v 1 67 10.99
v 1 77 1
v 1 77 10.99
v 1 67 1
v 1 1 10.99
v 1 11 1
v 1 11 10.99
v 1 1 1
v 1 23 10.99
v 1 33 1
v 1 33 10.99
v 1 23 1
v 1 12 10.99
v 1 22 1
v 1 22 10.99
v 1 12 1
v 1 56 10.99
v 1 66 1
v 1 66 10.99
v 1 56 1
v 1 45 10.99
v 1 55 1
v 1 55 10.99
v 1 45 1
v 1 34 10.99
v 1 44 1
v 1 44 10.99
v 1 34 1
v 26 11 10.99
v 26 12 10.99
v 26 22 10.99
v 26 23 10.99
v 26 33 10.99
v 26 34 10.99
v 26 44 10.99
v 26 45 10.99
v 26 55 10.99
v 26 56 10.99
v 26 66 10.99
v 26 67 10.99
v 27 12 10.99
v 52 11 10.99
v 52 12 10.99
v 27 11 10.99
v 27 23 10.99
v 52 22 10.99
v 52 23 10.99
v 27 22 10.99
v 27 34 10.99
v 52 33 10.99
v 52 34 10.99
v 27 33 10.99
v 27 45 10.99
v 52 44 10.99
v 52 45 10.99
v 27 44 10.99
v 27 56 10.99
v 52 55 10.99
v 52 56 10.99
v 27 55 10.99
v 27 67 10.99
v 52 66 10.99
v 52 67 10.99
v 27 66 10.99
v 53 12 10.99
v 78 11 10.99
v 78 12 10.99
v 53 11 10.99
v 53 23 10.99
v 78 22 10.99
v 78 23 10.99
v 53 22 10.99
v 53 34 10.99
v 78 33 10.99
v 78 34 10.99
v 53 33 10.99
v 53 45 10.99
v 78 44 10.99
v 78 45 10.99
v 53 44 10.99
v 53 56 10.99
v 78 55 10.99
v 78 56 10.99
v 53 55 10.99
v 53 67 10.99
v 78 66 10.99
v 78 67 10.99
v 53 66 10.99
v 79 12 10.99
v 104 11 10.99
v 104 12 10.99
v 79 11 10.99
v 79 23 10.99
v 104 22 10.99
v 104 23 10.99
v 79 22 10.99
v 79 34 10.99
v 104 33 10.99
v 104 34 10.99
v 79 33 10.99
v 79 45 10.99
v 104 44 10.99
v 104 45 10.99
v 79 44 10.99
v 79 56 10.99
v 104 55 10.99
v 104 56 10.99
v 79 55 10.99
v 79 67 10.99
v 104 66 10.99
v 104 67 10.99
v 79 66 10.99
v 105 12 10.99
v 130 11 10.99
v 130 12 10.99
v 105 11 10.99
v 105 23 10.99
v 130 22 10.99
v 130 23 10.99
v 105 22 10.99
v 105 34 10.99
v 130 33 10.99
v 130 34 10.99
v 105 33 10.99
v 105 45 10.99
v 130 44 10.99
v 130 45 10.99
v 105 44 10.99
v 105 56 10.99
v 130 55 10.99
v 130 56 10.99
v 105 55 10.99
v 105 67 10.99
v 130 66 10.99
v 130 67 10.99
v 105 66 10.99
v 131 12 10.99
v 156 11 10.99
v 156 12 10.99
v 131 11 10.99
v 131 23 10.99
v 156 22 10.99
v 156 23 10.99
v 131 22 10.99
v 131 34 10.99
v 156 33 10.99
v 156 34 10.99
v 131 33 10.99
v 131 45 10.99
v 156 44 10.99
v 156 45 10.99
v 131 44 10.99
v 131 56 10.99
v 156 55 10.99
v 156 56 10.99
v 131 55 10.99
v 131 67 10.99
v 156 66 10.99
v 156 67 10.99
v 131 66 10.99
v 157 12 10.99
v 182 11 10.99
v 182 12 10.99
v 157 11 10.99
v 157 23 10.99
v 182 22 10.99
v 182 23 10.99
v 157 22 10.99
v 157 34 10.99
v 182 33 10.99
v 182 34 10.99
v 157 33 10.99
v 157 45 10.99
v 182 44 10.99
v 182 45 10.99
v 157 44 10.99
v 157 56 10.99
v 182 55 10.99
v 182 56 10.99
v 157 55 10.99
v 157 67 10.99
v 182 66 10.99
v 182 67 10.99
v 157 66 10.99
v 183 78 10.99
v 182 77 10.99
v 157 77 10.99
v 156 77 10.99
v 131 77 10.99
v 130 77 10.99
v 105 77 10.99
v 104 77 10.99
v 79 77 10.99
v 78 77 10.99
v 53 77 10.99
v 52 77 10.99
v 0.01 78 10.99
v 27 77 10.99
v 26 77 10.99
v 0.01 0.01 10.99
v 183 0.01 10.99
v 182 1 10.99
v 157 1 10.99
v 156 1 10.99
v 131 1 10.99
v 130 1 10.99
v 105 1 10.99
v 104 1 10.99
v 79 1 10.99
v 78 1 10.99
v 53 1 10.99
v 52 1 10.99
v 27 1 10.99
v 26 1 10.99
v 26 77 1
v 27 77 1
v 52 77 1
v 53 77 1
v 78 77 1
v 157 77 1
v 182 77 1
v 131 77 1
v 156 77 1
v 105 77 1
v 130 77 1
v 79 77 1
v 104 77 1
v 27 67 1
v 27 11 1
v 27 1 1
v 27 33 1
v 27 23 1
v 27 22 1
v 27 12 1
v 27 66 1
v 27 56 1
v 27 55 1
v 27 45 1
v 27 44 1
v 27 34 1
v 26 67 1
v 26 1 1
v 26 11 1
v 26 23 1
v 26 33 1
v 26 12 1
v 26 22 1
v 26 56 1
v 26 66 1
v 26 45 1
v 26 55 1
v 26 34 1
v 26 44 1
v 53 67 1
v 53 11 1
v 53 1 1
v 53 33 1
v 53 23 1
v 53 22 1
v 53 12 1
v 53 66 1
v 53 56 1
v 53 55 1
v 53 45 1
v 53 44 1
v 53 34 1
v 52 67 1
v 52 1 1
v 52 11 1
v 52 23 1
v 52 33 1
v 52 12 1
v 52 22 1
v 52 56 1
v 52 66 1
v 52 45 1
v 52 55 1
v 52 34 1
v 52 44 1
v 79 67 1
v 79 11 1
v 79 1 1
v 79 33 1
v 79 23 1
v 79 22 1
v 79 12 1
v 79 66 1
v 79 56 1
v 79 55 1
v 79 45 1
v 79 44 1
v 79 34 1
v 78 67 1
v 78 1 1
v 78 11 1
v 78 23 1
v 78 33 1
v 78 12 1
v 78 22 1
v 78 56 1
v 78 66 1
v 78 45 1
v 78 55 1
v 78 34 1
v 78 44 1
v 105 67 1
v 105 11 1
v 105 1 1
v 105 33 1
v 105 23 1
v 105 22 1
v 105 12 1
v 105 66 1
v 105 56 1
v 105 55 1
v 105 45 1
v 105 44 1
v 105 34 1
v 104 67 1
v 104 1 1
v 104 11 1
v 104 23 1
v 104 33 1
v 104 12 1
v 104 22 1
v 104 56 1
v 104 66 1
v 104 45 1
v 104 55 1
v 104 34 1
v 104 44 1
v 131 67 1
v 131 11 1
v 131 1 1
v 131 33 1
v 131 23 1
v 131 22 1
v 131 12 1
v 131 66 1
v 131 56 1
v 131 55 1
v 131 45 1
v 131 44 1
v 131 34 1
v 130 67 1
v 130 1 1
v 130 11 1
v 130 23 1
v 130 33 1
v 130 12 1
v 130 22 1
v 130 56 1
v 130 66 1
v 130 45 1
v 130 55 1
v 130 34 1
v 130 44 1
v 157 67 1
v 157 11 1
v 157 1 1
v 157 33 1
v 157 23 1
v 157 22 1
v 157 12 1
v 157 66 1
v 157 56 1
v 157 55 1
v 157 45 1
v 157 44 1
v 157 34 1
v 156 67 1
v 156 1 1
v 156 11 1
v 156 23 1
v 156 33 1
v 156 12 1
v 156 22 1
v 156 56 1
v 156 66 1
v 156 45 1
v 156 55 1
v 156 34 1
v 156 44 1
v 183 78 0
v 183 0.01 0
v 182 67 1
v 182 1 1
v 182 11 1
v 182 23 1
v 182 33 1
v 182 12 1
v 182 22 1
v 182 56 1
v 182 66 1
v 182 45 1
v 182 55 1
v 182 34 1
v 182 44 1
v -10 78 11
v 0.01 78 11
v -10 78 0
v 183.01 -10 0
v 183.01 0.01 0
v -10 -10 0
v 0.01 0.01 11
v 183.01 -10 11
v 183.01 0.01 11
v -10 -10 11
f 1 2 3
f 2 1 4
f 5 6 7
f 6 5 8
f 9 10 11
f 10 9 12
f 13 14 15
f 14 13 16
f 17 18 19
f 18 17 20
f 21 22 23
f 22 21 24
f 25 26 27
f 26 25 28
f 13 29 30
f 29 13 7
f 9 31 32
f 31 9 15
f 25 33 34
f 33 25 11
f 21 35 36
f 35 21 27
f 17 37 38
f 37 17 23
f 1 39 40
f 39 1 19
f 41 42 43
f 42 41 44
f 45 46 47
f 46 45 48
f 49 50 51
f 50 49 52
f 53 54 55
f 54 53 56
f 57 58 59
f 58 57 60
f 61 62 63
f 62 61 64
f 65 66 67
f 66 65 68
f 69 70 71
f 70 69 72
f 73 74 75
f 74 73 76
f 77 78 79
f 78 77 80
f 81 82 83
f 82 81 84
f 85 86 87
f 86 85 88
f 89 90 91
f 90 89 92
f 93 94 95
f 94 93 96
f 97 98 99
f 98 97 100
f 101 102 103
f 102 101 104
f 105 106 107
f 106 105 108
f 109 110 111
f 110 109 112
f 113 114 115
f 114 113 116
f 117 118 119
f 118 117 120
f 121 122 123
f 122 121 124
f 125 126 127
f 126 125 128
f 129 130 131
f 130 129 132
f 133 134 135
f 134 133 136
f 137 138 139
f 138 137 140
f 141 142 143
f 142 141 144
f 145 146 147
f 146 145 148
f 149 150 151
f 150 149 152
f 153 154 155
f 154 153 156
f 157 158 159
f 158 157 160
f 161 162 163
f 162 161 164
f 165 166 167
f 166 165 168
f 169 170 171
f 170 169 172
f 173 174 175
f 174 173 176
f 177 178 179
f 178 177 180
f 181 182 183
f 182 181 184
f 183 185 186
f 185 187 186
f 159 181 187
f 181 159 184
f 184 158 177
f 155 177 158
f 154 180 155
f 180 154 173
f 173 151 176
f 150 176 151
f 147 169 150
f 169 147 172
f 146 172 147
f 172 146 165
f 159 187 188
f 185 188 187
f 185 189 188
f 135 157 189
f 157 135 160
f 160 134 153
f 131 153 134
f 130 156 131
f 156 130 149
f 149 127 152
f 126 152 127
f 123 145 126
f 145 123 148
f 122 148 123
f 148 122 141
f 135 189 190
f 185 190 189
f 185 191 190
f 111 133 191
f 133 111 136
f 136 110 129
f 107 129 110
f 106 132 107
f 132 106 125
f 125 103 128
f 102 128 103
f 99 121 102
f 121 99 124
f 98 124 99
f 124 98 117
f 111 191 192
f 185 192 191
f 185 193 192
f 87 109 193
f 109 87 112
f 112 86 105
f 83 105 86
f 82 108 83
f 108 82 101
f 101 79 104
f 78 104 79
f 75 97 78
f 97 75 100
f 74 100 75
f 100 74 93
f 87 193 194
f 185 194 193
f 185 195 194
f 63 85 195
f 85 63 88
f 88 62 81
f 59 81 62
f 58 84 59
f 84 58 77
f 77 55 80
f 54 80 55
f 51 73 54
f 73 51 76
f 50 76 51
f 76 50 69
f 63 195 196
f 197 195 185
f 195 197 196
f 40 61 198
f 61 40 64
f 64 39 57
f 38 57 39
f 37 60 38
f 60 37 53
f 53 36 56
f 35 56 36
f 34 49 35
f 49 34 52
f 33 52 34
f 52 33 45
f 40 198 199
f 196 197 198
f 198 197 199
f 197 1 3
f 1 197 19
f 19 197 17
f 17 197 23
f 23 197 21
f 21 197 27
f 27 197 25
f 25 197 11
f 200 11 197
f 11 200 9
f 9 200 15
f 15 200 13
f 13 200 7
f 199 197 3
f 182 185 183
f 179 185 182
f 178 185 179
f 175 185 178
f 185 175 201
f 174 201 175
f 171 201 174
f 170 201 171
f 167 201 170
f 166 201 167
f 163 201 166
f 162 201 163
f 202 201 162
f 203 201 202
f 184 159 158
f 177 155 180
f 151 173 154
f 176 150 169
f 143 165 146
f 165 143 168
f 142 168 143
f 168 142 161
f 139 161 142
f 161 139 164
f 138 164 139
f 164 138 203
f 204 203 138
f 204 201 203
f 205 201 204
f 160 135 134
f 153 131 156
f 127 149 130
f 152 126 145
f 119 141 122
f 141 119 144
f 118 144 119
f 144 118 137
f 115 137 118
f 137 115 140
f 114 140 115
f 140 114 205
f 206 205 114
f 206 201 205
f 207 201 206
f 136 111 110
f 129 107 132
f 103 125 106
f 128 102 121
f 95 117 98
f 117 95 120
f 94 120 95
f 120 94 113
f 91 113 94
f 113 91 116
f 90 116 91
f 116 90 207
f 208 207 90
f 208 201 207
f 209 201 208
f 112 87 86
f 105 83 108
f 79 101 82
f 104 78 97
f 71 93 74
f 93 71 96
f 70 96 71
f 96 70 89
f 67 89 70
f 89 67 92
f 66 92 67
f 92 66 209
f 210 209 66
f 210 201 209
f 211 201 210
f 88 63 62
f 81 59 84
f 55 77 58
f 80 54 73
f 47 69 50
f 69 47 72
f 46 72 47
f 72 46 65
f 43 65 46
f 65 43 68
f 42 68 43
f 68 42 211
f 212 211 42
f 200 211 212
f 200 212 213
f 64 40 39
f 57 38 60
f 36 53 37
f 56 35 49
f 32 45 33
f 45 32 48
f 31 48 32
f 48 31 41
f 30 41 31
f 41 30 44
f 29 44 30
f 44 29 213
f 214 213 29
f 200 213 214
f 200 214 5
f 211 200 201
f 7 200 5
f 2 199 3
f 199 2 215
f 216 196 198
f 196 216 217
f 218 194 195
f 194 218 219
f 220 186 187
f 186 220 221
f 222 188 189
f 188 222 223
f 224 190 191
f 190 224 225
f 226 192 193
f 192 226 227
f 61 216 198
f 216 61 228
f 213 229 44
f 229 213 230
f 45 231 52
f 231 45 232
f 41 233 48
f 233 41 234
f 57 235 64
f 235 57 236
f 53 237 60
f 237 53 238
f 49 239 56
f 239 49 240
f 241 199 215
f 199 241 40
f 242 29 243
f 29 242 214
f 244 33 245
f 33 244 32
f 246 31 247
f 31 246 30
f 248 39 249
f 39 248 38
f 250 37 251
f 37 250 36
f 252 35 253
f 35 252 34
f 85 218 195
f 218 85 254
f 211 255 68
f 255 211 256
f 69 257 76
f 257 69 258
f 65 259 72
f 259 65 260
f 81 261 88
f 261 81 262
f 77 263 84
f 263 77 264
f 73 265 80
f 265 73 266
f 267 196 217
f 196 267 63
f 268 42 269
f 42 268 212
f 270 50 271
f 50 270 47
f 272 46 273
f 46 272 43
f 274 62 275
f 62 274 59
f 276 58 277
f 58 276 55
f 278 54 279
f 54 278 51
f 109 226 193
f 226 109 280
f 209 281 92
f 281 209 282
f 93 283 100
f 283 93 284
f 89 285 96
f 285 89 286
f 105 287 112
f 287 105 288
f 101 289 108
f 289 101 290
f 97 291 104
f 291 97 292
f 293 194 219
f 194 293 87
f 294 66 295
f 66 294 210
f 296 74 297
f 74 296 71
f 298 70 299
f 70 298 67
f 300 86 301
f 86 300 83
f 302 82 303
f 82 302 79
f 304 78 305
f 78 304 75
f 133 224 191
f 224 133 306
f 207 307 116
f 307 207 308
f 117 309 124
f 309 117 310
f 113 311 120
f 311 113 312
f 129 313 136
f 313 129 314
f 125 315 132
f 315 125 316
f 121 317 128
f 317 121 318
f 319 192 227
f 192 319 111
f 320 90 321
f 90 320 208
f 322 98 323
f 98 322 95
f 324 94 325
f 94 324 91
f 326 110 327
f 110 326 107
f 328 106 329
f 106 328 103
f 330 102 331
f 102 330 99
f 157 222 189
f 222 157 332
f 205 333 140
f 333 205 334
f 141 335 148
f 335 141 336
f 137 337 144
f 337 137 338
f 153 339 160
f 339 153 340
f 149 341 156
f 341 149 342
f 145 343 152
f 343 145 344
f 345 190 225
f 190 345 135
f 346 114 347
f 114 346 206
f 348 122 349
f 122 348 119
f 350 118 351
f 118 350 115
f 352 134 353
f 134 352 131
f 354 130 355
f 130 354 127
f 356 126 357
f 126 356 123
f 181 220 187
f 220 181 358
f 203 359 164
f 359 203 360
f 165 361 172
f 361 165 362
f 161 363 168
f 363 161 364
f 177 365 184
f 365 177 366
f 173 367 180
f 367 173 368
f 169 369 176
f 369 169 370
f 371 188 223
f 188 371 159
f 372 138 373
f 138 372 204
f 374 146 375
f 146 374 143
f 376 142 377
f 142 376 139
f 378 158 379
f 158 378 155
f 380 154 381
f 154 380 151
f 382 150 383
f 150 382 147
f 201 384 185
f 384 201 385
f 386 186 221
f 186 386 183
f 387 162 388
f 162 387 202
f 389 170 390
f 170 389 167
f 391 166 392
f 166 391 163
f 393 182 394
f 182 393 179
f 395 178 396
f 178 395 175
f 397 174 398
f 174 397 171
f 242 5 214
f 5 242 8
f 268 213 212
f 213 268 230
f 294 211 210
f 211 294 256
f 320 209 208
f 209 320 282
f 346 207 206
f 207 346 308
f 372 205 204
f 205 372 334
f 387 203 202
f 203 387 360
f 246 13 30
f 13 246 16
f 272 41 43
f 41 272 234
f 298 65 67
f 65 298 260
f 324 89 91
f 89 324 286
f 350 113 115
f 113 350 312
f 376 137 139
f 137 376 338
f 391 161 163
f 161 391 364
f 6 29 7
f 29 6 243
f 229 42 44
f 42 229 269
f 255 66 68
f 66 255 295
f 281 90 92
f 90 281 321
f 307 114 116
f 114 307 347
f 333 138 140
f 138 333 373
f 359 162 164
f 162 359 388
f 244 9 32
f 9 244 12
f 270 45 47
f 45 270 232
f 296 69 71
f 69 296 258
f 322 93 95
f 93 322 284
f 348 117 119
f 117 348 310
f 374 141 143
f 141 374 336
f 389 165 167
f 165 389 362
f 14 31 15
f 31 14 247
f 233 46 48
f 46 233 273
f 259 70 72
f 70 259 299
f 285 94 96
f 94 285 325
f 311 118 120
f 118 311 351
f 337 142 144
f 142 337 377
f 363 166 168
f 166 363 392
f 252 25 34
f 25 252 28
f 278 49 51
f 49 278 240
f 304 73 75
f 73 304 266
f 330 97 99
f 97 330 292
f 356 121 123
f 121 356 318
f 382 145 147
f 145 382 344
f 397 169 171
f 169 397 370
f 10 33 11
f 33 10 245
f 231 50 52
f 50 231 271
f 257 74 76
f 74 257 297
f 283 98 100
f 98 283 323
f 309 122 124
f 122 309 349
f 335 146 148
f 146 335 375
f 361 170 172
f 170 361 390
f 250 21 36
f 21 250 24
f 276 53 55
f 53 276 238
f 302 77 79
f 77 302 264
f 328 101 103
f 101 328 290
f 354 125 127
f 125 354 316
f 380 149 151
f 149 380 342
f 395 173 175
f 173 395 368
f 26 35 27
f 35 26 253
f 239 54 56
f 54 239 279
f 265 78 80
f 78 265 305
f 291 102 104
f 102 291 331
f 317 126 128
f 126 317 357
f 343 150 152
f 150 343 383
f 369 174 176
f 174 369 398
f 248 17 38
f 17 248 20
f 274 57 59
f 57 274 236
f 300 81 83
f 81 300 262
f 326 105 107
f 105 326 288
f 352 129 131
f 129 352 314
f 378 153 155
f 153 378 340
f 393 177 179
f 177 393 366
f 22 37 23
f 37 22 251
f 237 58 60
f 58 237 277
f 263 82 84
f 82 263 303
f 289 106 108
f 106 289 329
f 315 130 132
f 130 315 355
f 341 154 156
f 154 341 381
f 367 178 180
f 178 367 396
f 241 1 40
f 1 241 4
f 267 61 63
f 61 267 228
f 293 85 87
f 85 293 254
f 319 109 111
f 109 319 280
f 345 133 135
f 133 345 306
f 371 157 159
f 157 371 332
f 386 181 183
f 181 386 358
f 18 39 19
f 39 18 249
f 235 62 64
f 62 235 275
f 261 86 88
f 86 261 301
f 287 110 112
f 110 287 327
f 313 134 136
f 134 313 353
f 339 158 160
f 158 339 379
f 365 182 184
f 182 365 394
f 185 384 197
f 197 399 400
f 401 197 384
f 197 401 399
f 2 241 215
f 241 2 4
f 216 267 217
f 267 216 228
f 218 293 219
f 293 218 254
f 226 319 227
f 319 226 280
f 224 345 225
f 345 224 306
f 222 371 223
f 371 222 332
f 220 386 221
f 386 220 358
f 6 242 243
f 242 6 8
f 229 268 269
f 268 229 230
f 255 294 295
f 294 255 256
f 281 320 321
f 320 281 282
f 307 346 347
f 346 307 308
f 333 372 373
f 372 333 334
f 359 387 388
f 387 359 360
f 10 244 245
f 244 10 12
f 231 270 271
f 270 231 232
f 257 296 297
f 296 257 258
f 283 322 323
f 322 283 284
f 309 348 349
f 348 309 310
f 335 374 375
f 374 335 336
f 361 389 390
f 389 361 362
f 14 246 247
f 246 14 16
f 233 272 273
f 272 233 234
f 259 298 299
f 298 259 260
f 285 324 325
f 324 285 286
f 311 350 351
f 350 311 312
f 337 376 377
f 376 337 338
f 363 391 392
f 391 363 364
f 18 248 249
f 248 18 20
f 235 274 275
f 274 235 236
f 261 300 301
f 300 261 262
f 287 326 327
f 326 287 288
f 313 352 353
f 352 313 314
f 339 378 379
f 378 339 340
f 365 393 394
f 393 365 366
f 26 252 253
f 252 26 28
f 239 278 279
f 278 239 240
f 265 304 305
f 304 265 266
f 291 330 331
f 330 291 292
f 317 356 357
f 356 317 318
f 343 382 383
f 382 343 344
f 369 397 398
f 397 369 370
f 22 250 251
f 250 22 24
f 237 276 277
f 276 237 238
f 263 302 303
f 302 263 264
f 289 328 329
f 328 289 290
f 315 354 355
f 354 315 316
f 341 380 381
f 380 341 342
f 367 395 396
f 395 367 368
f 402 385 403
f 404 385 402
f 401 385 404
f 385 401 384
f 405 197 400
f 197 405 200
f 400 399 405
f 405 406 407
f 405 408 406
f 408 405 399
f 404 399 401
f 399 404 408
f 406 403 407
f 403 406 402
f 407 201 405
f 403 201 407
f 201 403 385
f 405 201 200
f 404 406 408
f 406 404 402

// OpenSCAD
t      =  1;
h      = 10;
cellW  = 25;
cellD  = 10;
days   =  7;
perDay =  7;
eps    =  0.01;
tag    = 10;

cube( [ days * cellW + (days+1) * t, perDay * cellD + (perDay+1) * t, t ] );

translate( [ -tag, 0, 0 ] ) {
    cube( [ tag+eps, perDay * cellD + (perDay+1) * t, t+h ] );
}

translate( [ -tag, -tag, 0 ] ) {
    cube( [ tag+eps + days * cellW + (days+1) * t, tag+eps, t+h ] );
}

for( day = [ 0 : days ] ) {
    translate( [ day * ( cellW + t ), 0, t-eps ] ) {
        cube( [ t, perDay * (cellD+t) , h ] );
    }
}
for( when = [ 0 : perDay ] ) {
    translate( [ 0, when * ( cellD + t ), t-eps ] ) {
        cube( [ days * cellW + (days+1) * t, t, h ] );
    }
}
